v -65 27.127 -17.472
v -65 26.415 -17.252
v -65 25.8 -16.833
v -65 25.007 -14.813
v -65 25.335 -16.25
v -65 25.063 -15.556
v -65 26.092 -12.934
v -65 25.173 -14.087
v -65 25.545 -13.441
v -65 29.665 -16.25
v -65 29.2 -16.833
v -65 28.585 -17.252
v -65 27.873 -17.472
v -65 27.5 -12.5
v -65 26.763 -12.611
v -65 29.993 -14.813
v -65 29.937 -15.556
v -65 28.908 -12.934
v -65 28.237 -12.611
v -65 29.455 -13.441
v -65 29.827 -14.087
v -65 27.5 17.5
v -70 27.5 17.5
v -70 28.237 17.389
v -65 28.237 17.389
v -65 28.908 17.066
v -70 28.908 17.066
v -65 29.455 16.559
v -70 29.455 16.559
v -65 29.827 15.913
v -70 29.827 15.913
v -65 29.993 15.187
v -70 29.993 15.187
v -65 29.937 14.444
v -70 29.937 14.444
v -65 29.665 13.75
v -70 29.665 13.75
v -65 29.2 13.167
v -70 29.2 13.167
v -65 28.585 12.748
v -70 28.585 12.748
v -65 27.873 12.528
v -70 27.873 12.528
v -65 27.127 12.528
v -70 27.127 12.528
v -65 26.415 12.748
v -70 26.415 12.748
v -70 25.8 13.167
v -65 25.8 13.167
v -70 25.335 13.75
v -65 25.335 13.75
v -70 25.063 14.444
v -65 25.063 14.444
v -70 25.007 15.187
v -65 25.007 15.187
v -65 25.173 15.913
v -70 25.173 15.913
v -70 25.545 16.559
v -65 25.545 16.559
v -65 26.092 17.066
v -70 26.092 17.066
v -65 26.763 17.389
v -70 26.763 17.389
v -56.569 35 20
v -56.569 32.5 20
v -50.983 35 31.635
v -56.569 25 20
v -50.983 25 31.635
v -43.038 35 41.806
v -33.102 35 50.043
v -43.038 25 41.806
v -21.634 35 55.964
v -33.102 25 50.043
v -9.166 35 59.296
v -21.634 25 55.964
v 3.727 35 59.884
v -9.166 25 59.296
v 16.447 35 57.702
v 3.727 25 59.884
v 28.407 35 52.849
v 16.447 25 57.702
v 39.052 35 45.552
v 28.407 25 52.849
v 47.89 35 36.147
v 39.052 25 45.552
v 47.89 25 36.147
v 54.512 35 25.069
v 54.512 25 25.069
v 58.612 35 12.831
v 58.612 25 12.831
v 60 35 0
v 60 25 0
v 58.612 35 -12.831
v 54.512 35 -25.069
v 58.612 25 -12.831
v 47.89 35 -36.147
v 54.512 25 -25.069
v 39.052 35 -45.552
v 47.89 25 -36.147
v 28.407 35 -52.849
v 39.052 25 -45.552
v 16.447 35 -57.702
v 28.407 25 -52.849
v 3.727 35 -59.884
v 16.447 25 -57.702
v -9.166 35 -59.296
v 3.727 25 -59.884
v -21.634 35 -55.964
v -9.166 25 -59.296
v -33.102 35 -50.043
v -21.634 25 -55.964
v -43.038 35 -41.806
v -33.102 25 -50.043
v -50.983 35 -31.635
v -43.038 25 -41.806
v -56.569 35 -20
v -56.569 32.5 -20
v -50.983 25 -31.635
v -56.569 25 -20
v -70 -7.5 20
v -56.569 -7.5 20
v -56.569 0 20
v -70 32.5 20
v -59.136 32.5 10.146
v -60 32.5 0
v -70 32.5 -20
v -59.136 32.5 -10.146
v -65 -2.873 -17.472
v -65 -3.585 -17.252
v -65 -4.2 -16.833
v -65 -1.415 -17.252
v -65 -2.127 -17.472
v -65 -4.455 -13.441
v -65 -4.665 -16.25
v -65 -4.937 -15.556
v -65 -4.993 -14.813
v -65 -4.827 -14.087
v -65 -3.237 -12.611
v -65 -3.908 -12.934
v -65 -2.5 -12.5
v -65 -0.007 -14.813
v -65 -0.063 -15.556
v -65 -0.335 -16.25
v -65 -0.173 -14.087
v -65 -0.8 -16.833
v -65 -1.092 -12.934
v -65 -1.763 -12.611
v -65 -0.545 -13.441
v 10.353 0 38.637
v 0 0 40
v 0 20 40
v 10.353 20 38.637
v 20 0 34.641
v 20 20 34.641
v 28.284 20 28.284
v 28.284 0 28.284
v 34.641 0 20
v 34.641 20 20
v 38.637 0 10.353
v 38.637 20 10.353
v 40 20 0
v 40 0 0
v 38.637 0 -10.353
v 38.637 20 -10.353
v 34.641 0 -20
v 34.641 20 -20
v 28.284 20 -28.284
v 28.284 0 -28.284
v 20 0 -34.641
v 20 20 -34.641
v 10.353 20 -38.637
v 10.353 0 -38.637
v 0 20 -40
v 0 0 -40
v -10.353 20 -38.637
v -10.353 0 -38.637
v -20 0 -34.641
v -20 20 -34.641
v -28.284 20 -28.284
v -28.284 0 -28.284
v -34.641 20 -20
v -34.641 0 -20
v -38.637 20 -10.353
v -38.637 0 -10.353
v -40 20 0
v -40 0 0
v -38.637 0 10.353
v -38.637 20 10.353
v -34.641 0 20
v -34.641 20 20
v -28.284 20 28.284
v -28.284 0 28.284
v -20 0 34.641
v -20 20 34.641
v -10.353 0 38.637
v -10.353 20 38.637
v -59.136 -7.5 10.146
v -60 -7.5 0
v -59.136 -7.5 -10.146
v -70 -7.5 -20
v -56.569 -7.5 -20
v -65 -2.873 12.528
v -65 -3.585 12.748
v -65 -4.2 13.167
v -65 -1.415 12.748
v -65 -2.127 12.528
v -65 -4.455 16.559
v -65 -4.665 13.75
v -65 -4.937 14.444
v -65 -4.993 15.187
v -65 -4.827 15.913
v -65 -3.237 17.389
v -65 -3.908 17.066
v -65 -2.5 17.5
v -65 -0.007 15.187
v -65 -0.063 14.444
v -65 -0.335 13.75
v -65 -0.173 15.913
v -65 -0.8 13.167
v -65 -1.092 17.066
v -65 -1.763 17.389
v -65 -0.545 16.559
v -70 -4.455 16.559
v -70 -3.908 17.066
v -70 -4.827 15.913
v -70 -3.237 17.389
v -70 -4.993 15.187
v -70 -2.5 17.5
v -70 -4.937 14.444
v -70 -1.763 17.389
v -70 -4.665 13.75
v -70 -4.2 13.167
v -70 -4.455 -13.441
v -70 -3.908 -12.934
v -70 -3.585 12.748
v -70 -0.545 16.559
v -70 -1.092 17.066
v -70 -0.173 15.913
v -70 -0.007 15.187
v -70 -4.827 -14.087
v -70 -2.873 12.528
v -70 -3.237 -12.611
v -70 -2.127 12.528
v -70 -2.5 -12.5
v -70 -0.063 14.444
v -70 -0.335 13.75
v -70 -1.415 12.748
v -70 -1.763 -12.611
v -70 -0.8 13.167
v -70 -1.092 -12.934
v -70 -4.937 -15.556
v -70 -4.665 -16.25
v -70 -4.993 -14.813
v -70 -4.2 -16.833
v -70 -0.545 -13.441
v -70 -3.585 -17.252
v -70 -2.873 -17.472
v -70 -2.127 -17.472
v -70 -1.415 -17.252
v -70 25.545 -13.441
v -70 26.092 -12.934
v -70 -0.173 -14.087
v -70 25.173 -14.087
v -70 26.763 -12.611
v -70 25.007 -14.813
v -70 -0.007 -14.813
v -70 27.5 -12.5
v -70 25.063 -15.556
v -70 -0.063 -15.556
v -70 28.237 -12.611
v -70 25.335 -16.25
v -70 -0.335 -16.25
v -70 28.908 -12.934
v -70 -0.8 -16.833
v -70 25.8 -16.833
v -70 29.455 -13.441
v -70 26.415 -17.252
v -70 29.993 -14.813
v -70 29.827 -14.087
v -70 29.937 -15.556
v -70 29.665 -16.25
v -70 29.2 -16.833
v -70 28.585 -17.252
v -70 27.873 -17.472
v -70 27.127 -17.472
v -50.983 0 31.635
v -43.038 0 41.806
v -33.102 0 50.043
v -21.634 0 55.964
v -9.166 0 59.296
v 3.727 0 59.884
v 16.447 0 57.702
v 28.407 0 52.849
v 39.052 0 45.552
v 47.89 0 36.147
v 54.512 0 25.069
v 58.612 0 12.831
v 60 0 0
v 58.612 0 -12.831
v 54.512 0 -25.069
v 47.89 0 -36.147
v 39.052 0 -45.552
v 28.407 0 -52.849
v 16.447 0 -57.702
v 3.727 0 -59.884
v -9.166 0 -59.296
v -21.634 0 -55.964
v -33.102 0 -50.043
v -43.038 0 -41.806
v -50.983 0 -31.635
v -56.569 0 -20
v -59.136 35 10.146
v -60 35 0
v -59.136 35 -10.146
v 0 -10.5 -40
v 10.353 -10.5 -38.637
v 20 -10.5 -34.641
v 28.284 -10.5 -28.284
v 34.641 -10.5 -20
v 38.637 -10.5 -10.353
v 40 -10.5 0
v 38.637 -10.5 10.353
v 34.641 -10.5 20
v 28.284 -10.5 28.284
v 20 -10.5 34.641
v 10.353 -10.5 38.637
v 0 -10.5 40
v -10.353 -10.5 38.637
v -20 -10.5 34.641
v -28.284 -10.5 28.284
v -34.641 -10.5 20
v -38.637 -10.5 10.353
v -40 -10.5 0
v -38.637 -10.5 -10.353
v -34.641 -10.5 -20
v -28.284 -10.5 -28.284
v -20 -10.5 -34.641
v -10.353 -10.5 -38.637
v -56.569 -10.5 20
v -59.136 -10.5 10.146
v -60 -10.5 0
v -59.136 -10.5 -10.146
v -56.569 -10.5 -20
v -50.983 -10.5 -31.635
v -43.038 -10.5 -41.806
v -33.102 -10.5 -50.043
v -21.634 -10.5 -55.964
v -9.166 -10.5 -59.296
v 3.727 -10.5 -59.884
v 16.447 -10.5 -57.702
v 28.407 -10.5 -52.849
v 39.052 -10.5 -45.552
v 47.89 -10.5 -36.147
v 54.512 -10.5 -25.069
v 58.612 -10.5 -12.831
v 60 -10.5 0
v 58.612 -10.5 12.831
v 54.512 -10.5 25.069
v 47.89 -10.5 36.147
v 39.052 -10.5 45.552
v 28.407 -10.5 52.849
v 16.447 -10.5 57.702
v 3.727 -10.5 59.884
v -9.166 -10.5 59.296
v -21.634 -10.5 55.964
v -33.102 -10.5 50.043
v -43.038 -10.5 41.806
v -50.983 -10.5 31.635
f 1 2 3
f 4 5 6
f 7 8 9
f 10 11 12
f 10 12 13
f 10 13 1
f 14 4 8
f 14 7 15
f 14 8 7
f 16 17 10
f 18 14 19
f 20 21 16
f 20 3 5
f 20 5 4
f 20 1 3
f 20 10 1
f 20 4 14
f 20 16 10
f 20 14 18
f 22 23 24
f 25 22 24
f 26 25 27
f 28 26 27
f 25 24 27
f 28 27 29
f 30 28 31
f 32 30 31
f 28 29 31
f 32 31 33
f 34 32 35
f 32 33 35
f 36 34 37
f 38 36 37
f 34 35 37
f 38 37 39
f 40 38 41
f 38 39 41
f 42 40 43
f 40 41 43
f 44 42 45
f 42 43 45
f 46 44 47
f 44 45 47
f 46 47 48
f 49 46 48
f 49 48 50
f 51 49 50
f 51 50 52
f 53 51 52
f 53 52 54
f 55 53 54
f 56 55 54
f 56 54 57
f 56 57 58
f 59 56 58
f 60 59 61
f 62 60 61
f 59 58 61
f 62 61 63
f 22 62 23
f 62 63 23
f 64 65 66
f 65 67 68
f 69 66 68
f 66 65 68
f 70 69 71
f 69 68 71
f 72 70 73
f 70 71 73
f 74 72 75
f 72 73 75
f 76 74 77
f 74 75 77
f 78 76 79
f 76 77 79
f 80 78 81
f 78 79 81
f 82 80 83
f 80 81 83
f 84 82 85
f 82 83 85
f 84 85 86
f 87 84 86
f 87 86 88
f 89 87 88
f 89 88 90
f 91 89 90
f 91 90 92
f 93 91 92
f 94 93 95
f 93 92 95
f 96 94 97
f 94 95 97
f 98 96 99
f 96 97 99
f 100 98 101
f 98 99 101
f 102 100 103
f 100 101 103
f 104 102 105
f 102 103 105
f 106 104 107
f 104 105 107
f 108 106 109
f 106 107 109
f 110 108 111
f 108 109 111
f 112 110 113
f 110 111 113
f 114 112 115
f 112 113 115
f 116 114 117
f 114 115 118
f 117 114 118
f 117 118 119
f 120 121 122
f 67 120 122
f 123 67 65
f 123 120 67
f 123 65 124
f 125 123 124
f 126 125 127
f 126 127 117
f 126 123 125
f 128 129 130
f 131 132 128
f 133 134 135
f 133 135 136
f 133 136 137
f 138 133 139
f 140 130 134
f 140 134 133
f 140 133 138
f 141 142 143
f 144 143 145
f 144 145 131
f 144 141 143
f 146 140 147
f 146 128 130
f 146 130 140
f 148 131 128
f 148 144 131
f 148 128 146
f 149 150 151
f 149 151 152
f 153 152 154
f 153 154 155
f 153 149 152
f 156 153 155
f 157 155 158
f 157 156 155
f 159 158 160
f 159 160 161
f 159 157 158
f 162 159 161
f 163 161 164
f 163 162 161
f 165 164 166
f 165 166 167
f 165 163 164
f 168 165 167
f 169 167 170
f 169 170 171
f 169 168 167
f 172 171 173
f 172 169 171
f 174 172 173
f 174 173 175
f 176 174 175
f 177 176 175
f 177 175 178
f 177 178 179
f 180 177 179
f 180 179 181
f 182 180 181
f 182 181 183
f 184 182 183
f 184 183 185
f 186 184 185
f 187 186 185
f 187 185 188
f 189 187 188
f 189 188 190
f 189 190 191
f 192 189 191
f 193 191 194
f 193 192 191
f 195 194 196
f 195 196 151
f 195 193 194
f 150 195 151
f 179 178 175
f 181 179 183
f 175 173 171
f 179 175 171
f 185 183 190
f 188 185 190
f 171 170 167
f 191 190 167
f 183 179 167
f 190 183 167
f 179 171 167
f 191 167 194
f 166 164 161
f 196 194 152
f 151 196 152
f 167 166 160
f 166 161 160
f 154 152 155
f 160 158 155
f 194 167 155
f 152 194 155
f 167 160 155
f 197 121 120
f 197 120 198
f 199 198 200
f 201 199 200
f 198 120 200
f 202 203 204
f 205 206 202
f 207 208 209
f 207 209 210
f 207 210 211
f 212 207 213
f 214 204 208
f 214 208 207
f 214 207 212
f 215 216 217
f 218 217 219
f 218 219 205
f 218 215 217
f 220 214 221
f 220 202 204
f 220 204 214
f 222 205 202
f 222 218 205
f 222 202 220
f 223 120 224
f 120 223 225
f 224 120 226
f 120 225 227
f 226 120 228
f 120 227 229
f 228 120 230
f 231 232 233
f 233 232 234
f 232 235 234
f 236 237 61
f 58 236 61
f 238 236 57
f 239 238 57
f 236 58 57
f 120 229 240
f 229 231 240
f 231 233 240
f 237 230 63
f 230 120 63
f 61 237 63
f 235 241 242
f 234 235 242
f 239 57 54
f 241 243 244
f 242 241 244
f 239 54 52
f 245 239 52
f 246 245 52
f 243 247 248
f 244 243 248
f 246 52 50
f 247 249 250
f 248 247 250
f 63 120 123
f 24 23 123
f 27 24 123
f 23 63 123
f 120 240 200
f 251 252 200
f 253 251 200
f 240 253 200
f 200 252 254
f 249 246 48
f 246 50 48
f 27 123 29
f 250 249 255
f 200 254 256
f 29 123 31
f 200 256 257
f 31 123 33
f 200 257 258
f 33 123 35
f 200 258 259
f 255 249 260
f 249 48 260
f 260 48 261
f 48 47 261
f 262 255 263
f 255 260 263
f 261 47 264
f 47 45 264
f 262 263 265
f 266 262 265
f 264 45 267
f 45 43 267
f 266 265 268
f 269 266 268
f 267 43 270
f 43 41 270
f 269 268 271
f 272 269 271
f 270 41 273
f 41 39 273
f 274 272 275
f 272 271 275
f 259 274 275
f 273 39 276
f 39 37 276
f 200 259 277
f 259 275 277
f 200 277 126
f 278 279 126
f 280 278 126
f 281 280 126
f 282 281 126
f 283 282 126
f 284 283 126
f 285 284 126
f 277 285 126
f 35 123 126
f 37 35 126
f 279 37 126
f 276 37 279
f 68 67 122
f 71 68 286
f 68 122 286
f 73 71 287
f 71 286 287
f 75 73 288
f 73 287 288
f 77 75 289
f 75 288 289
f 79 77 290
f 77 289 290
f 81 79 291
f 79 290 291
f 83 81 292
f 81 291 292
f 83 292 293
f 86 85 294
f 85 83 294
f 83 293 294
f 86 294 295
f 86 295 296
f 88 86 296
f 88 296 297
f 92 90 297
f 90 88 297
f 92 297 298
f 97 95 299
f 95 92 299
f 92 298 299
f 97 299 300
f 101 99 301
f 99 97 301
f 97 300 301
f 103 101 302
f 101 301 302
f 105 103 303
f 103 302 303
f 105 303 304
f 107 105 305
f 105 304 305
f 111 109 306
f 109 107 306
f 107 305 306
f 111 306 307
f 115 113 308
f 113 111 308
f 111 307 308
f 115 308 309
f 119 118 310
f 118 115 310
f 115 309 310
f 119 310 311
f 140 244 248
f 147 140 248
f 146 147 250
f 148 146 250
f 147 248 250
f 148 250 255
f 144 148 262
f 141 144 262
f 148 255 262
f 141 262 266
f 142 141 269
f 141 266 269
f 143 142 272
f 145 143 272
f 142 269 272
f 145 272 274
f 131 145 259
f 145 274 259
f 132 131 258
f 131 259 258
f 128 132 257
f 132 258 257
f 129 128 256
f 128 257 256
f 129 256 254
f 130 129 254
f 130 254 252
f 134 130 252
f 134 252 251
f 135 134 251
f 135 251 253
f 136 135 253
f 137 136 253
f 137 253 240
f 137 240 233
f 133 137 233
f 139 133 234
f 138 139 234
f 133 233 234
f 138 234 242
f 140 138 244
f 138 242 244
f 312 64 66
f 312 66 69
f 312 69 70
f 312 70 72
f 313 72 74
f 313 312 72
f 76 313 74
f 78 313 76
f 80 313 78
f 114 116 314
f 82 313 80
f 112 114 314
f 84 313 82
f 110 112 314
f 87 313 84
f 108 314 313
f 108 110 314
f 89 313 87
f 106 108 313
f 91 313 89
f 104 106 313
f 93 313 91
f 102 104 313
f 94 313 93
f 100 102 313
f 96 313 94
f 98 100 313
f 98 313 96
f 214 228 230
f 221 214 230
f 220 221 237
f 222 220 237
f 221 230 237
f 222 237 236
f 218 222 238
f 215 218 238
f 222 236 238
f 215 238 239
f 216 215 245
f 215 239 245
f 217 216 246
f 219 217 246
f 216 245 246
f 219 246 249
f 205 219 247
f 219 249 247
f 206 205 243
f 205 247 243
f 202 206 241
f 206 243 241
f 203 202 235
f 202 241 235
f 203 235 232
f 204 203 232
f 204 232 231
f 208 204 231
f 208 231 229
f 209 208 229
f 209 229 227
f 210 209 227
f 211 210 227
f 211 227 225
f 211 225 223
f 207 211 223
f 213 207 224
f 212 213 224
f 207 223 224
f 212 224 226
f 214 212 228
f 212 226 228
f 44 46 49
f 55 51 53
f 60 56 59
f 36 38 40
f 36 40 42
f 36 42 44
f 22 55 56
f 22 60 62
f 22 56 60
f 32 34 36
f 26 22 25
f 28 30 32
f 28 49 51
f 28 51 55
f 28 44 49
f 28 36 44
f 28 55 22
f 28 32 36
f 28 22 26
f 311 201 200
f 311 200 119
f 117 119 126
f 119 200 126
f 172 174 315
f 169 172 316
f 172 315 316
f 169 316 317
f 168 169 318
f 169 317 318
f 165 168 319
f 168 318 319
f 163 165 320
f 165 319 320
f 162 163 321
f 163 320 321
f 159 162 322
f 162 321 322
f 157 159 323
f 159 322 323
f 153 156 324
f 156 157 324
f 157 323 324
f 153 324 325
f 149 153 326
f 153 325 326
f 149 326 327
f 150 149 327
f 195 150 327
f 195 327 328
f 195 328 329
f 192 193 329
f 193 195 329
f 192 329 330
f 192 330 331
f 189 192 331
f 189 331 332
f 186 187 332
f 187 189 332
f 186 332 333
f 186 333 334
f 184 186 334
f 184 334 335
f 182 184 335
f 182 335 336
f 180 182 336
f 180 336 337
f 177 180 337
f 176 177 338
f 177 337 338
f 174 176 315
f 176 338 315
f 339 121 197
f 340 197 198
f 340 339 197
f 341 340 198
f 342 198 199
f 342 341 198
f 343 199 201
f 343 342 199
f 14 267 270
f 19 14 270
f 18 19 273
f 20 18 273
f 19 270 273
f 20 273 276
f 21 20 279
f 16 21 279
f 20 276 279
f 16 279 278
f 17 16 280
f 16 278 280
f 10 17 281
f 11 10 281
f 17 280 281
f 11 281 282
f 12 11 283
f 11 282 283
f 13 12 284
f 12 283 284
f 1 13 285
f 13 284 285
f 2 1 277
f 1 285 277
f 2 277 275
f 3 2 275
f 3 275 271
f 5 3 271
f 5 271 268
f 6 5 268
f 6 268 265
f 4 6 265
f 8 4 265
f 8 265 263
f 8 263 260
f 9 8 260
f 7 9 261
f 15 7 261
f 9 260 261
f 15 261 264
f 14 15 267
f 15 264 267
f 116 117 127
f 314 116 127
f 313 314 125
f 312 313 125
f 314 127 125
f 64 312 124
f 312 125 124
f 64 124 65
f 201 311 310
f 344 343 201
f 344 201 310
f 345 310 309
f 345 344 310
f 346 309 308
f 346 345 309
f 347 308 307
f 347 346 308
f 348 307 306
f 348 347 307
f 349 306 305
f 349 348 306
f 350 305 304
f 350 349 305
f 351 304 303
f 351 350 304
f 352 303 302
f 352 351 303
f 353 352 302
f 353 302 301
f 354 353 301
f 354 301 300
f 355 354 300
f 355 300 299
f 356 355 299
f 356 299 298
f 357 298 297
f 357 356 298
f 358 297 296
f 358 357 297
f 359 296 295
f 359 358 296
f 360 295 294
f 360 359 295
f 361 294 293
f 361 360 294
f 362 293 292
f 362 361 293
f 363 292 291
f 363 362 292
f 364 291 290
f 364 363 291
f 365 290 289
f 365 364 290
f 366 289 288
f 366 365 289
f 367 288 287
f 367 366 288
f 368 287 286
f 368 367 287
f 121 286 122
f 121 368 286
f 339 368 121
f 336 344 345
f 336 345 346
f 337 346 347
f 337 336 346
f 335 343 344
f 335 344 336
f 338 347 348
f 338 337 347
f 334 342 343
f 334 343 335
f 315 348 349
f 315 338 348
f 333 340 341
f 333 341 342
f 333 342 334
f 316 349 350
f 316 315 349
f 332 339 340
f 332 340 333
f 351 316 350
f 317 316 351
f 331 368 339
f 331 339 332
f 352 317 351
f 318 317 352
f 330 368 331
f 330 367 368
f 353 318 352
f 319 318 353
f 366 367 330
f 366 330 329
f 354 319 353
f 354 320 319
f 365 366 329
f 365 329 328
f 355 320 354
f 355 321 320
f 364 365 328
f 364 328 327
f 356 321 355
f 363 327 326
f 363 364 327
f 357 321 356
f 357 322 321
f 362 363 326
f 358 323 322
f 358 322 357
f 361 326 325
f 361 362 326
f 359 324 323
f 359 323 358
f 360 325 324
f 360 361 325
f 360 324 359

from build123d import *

# Parameters (mm, degrees)
SKETCH_1_R           = 60
SKETCH_1_R_2         = 40
EXTRUDE_1_DEPTH      = 20
SKETCH_2_R           = 60
EXTRUDE_4_DEPTH      = 5
EXTRUDE_5_REACH      = 160.459
EXTRUDE_5_END_RADIUS = 60
EXTRUDE_START        = -70
SKETCH_3_W           = 40
SKETCH_3_H           = 40
SKETCH_4_R           = 2.5
CUT_EXTRUDE_1_DEPTH  = 5
EXTRUDE_START_2      = 10.5
SKETCH_5_R           = 40
EXTRUDE_6_DEPTH      = 10.5
EXTRUDE_7_DEPTH      = 10


with BuildPart() as part:
    # 草图1 → 凸台-拉伸1 (new body)
    with BuildSketch(Plane(origin=(0, 0, 0), x_dir=(1, 0, 0), z_dir=(0, 1, 0))):
        with Locations(Location((0, 0, 0), (0, 0, 270))):
            Circle(SKETCH_1_R)
        with Locations(Location((0, 0, 0), (0, 0, 270))):
            Circle(SKETCH_1_R_2, mode=Mode.SUBTRACT)
    extrude(amount=EXTRUDE_1_DEPTH)

    # 草图2 → 凸台-拉伸4 (add)
    with BuildSketch(Plane(origin=(0, 20, 0), x_dir=(1, 0, 0), z_dir=(0, 1, 0))):
        with Locations(Location((0, 0, 0), (0, 0, 270))):
            Circle(SKETCH_2_R)
    extrude(amount=EXTRUDE_4_DEPTH)

    # 凸台-拉伸5: up to this cylinder (the profile starts outside it)
    extrude_5_end = Plane(origin=(0, 12.5, 0), z_dir=(0, -1, 0)) * Cylinder(EXTRUDE_5_END_RADIUS, 441.918, mode=Mode.PRIVATE)
    # 草图3 → 凸台-拉伸5 (add, up to the surface)
    with BuildSketch(Plane(origin=(0, 0, 0), x_dir=(0, 0, -1), z_dir=(1, 0, 0)).offset(EXTRUDE_START), mode=Mode.PRIVATE) as extrude_5_sk1:
        with Locations((0, 12.5)):
            Rectangle(SKETCH_3_W, SKETCH_3_H)
    extrude_5_tool1 = extrude(extrude_5_sk1.sketch, amount=EXTRUDE_5_REACH, mode=Mode.PRIVATE) - extrude_5_end
    add(extrude_5_tool1.solids().sort_by_distance((-70, 12.5, 0))[0])

    # 草图4 → 切除-拉伸1 (cut)
    with BuildSketch(Plane.ZY.offset(70)):
        with Locations((-15, 27.5)):
            Circle(SKETCH_4_R)
        with Locations((15, 27.5)):
            Circle(SKETCH_4_R)
        with Locations((15, -2.5)):
            Circle(SKETCH_4_R)
        with Locations((-15, -2.5)):
            Circle(SKETCH_4_R)
    extrude(amount=-CUT_EXTRUDE_1_DEPTH, mode=Mode.SUBTRACT)

    # 草图5 → 凸台-拉伸6 (add)
    with BuildSketch(Plane.XZ.offset(EXTRUDE_START_2)):
        with BuildLine():
            ThreePointArc((-56.568542495, 20), (-60, 0), (-56.568542495, -20))
            ThreePointArc((-56.568542495, -20), (60, 0), (-56.568542495, 20))
        make_face()
        with Locations(Location((0, 0, 0), (0, 0, 270))):
            Circle(SKETCH_5_R, mode=Mode.SUBTRACT)
    extrude(amount=-EXTRUDE_6_DEPTH)

    # 草图6 → 凸台-拉伸7 (add)
    with BuildSketch(Plane(origin=(0, 25, 0), x_dir=(1, 0, 0), z_dir=(0, 1, 0))):
        with BuildLine():
            ThreePointArc((-56.568542495, 20), (-60, 0), (-56.568542495, -20))
            ThreePointArc((-56.568542495, -20), (60, 0), (-56.568542495, 20))
        make_face()
    extrude(amount=EXTRUDE_7_DEPTH)


solid = part.part
